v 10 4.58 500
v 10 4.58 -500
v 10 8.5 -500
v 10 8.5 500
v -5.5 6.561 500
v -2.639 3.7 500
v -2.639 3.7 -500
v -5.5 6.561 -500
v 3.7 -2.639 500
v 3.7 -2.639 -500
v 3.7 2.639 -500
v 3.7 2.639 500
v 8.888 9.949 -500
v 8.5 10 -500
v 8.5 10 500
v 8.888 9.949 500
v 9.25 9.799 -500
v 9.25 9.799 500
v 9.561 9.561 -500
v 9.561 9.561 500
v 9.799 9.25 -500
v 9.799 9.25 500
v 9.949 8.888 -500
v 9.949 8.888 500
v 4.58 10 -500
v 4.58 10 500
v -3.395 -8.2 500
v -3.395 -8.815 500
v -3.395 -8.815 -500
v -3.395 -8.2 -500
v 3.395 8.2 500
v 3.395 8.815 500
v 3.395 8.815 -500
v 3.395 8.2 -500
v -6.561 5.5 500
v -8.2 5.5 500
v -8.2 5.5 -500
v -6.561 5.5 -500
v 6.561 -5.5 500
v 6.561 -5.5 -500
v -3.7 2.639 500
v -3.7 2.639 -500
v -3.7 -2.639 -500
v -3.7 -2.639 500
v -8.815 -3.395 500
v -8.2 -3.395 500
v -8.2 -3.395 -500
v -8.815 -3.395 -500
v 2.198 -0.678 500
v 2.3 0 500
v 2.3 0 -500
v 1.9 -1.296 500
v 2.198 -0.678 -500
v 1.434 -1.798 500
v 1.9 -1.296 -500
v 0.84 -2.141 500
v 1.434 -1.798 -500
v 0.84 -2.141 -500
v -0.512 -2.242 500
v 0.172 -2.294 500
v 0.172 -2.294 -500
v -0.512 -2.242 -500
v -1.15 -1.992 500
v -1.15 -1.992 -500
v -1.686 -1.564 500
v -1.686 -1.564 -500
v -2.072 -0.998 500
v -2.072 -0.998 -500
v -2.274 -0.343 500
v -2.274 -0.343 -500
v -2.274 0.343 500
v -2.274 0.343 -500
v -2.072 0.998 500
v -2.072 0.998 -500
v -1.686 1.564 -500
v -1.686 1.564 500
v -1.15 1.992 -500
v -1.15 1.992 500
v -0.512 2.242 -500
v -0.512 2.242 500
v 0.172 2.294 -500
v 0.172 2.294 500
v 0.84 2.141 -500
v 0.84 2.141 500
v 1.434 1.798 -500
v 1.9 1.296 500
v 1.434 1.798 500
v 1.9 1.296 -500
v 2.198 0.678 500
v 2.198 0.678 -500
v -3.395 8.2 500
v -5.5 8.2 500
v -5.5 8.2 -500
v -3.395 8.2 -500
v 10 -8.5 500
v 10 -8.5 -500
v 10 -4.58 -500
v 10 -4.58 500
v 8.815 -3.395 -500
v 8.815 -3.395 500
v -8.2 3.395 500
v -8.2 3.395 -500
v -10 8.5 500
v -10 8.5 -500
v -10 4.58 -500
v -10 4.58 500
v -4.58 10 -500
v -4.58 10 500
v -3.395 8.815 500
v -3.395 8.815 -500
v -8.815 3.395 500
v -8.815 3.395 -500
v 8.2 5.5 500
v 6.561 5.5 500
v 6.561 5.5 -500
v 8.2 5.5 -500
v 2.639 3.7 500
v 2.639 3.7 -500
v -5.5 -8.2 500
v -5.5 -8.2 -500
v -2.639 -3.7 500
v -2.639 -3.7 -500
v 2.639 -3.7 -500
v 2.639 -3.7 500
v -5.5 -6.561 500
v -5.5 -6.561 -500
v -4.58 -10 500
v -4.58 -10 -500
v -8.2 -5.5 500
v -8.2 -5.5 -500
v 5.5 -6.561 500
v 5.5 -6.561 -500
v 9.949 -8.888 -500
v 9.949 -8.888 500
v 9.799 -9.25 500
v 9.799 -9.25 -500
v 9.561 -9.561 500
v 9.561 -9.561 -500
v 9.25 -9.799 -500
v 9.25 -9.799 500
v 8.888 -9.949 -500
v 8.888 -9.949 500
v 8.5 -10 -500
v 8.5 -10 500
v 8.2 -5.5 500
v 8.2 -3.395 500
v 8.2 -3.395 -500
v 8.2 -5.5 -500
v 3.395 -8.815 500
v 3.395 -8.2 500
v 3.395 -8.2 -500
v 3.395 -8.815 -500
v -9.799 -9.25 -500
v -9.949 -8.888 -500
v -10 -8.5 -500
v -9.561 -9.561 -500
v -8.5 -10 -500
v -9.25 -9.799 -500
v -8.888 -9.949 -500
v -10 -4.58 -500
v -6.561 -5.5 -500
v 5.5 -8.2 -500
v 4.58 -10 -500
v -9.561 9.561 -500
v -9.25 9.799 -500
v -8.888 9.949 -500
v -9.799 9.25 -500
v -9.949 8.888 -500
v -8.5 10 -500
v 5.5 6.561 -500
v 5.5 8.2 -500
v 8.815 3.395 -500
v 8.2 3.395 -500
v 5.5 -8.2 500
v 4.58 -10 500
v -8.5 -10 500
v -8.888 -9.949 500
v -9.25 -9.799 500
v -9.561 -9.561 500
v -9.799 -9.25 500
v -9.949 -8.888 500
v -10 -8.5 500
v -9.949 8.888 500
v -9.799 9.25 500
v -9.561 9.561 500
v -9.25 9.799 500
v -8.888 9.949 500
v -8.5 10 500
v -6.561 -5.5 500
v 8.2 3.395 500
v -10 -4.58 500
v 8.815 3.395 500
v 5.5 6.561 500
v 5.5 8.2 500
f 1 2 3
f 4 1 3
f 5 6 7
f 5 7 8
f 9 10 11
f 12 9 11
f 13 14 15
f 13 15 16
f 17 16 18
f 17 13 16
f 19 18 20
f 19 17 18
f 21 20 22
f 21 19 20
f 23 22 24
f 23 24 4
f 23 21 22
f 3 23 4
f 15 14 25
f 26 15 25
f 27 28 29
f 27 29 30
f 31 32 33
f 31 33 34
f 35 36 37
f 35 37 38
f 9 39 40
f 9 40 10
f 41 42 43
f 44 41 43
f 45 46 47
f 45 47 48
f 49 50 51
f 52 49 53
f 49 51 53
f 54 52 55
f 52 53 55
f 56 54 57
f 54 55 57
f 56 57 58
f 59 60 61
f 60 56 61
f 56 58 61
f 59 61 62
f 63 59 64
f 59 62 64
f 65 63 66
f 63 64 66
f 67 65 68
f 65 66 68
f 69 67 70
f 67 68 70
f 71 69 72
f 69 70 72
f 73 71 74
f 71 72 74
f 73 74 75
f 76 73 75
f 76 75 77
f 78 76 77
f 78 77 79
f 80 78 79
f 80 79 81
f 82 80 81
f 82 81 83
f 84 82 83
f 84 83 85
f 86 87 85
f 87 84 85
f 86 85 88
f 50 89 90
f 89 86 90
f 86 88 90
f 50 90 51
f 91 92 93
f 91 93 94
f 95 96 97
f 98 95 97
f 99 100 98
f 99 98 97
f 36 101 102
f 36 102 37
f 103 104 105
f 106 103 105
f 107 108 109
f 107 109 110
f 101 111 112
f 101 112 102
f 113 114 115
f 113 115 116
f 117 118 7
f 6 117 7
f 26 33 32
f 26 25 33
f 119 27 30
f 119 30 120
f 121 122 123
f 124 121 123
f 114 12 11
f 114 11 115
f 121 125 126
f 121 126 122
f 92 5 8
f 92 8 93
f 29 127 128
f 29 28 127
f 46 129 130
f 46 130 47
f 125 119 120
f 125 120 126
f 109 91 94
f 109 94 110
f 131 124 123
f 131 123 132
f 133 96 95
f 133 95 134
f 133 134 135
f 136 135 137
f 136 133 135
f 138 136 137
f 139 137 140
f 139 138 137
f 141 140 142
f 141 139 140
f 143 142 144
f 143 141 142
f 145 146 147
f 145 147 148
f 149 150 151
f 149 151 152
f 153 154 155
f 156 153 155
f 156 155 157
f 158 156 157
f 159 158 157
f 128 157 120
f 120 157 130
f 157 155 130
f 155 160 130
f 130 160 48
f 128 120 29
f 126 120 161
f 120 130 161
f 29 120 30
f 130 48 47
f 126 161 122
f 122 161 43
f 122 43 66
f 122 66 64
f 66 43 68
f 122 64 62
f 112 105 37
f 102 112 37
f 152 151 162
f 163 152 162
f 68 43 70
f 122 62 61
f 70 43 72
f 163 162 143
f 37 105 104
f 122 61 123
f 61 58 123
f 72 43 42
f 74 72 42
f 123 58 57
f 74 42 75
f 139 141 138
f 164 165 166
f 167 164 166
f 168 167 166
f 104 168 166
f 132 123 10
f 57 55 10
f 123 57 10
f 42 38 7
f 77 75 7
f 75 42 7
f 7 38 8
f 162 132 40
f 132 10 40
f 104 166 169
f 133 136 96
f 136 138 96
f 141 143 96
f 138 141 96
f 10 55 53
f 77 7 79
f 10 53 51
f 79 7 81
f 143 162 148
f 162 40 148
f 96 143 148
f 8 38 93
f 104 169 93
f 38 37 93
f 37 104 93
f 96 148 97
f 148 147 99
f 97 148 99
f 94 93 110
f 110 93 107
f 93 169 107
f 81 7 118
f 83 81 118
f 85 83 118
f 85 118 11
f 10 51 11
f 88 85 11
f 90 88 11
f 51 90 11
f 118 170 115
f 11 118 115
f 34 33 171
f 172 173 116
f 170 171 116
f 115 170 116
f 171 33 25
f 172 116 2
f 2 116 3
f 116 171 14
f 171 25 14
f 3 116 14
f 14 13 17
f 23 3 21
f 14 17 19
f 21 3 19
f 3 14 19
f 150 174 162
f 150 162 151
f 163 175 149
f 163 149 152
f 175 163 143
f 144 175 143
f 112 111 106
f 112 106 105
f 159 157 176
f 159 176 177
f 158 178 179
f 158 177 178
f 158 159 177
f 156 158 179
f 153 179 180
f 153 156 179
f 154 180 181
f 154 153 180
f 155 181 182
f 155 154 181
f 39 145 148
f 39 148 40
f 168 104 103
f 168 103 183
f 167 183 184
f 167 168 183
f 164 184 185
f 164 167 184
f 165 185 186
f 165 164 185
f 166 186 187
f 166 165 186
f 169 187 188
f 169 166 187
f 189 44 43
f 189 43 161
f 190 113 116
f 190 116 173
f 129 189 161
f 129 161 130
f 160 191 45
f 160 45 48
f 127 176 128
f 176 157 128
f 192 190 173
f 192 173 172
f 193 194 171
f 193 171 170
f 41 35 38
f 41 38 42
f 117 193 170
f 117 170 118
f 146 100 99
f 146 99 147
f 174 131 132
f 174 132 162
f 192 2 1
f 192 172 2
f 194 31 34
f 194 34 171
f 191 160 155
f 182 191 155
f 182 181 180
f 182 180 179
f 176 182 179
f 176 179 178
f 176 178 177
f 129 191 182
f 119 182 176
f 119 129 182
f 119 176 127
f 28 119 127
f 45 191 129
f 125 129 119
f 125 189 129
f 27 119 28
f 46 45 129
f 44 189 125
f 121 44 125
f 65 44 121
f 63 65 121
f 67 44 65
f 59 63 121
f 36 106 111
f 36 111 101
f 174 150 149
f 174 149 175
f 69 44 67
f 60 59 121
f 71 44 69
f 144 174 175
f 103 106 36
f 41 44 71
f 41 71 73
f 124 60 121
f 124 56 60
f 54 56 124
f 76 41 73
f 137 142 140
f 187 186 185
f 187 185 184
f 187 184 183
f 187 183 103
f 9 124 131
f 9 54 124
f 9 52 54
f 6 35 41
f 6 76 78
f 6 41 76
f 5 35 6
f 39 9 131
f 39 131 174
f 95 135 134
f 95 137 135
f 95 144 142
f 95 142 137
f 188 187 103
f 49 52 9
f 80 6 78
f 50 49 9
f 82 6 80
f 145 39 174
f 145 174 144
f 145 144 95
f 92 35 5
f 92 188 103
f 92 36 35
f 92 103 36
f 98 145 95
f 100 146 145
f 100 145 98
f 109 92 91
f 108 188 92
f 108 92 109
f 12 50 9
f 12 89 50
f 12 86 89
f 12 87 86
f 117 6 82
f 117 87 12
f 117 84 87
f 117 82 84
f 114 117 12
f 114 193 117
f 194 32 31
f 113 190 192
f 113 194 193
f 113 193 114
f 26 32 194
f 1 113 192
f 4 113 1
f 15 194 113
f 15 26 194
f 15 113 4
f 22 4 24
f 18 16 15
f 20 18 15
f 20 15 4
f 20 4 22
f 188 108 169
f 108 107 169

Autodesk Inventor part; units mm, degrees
ref_plane "YZ Plane" through (0, 0, 0) normal (1, 0, 0) x (0, 1, 0)
ref_plane "XZ Plane" through (0, 0, 0) normal (0, 1, 0) x (-1, 0, 0)
ref_plane "XY Plane" through (0, 0, 0) normal (0, 0, 1) x (1, 0, 0)
sketch "Sketch1" plane through (0, 0, 0) normal (0, 0, 1) x (1, 0, 0)
  line L0 (0, 3.7) -> (-2.6393, 3.7)
  line L1 (-2.6393, 3.7) -> (-5.5, 6.5607)
  line L2 (-5.5, 6.5607) -> (-5.5, 8.2)
  line L3 (-5.5, 8.2) -> (-3.395, 8.2)
  line L4 (-3.395, 8.2) -> (-3.395, 10)
  line L5 (-3.395, 10) -> (-10, 10)
  line L6 (-10, 10) -> (-10, 3.395)
  line L7 (-10, 3.395) -> (-8.2, 3.395)
  line L8 (-8.2, 3.395) -> (-8.2, 5.5)
  line L9 (-8.2, 5.5) -> (-6.5607, 5.5)
  line L10 (-6.5607, 5.5) -> (-3.7, 2.6393)
  line L11 (-3.7, 2.6393) -> (-3.7, 0)
  line L12 (0, 0) -> (-10, 10) construction
  circle A0 centre (0, 0) radius 2.3
  line L13 (-22.6601, 0) -> (65.9605, 0) projected
  line L14 (-3.7, 0) -> (0, 0)
  line L15 (0, 0) -> (0, 3.7)
  line L16 (11.2521, 18.9743) -> (53.3004, 18.9743) construction
  line L17 (53.3004, 18.9743) -> (53.3004, -5.624) construction
  line L18 (53.3004, -5.624) -> (11.2521, -5.624) construction
  line L19 (11.2521, -5.624) -> (11.2521, 18.9743) construction
  point P0 (-2.3, 0)
  point P1 (0, 2.3)
  dimension "d0" = 1.5
  dimension "d6" = 6.3
  dimension "d9" = 4.6
  dimension "d18" = 135
  dimension "d22" = 20
  dimension "d34" = 11
  dimension "d35" = 6.79
  dimension "d36" = 1.8
extrude "Extrusion1" add sketch "Sketch1" along normal mid plane 1000 contours L15 A0 L13 L11 L10 L9 L8 L7 L6 L5 L4 L3 L2 L1 L0
pattern_circular "Circular Pattern1" count 4 over 360 about axis through (0, 0, -10) along (0, 0, 1) of "Extrusion1"
chamfer "Chamfer1" distance 1.185 angle 45 8 edges at (-3.395, 10, 0) (3.395, 10, 0) (10, 3.395, 0) (10, -3.395, 0) (3.395, -10, 0) (-3.395, -10, 0) (-10, -3.395, 0) (-10, 3.395, 0)
fillet "Fillet1" radius 1.5 4 edges at (-10, 10, 0) (10, 10, 0) (-10, -10, 0) (10, -10, 0)
properties part number "2020aluminum_extrusion_silver" material "Aluminum 6061"
